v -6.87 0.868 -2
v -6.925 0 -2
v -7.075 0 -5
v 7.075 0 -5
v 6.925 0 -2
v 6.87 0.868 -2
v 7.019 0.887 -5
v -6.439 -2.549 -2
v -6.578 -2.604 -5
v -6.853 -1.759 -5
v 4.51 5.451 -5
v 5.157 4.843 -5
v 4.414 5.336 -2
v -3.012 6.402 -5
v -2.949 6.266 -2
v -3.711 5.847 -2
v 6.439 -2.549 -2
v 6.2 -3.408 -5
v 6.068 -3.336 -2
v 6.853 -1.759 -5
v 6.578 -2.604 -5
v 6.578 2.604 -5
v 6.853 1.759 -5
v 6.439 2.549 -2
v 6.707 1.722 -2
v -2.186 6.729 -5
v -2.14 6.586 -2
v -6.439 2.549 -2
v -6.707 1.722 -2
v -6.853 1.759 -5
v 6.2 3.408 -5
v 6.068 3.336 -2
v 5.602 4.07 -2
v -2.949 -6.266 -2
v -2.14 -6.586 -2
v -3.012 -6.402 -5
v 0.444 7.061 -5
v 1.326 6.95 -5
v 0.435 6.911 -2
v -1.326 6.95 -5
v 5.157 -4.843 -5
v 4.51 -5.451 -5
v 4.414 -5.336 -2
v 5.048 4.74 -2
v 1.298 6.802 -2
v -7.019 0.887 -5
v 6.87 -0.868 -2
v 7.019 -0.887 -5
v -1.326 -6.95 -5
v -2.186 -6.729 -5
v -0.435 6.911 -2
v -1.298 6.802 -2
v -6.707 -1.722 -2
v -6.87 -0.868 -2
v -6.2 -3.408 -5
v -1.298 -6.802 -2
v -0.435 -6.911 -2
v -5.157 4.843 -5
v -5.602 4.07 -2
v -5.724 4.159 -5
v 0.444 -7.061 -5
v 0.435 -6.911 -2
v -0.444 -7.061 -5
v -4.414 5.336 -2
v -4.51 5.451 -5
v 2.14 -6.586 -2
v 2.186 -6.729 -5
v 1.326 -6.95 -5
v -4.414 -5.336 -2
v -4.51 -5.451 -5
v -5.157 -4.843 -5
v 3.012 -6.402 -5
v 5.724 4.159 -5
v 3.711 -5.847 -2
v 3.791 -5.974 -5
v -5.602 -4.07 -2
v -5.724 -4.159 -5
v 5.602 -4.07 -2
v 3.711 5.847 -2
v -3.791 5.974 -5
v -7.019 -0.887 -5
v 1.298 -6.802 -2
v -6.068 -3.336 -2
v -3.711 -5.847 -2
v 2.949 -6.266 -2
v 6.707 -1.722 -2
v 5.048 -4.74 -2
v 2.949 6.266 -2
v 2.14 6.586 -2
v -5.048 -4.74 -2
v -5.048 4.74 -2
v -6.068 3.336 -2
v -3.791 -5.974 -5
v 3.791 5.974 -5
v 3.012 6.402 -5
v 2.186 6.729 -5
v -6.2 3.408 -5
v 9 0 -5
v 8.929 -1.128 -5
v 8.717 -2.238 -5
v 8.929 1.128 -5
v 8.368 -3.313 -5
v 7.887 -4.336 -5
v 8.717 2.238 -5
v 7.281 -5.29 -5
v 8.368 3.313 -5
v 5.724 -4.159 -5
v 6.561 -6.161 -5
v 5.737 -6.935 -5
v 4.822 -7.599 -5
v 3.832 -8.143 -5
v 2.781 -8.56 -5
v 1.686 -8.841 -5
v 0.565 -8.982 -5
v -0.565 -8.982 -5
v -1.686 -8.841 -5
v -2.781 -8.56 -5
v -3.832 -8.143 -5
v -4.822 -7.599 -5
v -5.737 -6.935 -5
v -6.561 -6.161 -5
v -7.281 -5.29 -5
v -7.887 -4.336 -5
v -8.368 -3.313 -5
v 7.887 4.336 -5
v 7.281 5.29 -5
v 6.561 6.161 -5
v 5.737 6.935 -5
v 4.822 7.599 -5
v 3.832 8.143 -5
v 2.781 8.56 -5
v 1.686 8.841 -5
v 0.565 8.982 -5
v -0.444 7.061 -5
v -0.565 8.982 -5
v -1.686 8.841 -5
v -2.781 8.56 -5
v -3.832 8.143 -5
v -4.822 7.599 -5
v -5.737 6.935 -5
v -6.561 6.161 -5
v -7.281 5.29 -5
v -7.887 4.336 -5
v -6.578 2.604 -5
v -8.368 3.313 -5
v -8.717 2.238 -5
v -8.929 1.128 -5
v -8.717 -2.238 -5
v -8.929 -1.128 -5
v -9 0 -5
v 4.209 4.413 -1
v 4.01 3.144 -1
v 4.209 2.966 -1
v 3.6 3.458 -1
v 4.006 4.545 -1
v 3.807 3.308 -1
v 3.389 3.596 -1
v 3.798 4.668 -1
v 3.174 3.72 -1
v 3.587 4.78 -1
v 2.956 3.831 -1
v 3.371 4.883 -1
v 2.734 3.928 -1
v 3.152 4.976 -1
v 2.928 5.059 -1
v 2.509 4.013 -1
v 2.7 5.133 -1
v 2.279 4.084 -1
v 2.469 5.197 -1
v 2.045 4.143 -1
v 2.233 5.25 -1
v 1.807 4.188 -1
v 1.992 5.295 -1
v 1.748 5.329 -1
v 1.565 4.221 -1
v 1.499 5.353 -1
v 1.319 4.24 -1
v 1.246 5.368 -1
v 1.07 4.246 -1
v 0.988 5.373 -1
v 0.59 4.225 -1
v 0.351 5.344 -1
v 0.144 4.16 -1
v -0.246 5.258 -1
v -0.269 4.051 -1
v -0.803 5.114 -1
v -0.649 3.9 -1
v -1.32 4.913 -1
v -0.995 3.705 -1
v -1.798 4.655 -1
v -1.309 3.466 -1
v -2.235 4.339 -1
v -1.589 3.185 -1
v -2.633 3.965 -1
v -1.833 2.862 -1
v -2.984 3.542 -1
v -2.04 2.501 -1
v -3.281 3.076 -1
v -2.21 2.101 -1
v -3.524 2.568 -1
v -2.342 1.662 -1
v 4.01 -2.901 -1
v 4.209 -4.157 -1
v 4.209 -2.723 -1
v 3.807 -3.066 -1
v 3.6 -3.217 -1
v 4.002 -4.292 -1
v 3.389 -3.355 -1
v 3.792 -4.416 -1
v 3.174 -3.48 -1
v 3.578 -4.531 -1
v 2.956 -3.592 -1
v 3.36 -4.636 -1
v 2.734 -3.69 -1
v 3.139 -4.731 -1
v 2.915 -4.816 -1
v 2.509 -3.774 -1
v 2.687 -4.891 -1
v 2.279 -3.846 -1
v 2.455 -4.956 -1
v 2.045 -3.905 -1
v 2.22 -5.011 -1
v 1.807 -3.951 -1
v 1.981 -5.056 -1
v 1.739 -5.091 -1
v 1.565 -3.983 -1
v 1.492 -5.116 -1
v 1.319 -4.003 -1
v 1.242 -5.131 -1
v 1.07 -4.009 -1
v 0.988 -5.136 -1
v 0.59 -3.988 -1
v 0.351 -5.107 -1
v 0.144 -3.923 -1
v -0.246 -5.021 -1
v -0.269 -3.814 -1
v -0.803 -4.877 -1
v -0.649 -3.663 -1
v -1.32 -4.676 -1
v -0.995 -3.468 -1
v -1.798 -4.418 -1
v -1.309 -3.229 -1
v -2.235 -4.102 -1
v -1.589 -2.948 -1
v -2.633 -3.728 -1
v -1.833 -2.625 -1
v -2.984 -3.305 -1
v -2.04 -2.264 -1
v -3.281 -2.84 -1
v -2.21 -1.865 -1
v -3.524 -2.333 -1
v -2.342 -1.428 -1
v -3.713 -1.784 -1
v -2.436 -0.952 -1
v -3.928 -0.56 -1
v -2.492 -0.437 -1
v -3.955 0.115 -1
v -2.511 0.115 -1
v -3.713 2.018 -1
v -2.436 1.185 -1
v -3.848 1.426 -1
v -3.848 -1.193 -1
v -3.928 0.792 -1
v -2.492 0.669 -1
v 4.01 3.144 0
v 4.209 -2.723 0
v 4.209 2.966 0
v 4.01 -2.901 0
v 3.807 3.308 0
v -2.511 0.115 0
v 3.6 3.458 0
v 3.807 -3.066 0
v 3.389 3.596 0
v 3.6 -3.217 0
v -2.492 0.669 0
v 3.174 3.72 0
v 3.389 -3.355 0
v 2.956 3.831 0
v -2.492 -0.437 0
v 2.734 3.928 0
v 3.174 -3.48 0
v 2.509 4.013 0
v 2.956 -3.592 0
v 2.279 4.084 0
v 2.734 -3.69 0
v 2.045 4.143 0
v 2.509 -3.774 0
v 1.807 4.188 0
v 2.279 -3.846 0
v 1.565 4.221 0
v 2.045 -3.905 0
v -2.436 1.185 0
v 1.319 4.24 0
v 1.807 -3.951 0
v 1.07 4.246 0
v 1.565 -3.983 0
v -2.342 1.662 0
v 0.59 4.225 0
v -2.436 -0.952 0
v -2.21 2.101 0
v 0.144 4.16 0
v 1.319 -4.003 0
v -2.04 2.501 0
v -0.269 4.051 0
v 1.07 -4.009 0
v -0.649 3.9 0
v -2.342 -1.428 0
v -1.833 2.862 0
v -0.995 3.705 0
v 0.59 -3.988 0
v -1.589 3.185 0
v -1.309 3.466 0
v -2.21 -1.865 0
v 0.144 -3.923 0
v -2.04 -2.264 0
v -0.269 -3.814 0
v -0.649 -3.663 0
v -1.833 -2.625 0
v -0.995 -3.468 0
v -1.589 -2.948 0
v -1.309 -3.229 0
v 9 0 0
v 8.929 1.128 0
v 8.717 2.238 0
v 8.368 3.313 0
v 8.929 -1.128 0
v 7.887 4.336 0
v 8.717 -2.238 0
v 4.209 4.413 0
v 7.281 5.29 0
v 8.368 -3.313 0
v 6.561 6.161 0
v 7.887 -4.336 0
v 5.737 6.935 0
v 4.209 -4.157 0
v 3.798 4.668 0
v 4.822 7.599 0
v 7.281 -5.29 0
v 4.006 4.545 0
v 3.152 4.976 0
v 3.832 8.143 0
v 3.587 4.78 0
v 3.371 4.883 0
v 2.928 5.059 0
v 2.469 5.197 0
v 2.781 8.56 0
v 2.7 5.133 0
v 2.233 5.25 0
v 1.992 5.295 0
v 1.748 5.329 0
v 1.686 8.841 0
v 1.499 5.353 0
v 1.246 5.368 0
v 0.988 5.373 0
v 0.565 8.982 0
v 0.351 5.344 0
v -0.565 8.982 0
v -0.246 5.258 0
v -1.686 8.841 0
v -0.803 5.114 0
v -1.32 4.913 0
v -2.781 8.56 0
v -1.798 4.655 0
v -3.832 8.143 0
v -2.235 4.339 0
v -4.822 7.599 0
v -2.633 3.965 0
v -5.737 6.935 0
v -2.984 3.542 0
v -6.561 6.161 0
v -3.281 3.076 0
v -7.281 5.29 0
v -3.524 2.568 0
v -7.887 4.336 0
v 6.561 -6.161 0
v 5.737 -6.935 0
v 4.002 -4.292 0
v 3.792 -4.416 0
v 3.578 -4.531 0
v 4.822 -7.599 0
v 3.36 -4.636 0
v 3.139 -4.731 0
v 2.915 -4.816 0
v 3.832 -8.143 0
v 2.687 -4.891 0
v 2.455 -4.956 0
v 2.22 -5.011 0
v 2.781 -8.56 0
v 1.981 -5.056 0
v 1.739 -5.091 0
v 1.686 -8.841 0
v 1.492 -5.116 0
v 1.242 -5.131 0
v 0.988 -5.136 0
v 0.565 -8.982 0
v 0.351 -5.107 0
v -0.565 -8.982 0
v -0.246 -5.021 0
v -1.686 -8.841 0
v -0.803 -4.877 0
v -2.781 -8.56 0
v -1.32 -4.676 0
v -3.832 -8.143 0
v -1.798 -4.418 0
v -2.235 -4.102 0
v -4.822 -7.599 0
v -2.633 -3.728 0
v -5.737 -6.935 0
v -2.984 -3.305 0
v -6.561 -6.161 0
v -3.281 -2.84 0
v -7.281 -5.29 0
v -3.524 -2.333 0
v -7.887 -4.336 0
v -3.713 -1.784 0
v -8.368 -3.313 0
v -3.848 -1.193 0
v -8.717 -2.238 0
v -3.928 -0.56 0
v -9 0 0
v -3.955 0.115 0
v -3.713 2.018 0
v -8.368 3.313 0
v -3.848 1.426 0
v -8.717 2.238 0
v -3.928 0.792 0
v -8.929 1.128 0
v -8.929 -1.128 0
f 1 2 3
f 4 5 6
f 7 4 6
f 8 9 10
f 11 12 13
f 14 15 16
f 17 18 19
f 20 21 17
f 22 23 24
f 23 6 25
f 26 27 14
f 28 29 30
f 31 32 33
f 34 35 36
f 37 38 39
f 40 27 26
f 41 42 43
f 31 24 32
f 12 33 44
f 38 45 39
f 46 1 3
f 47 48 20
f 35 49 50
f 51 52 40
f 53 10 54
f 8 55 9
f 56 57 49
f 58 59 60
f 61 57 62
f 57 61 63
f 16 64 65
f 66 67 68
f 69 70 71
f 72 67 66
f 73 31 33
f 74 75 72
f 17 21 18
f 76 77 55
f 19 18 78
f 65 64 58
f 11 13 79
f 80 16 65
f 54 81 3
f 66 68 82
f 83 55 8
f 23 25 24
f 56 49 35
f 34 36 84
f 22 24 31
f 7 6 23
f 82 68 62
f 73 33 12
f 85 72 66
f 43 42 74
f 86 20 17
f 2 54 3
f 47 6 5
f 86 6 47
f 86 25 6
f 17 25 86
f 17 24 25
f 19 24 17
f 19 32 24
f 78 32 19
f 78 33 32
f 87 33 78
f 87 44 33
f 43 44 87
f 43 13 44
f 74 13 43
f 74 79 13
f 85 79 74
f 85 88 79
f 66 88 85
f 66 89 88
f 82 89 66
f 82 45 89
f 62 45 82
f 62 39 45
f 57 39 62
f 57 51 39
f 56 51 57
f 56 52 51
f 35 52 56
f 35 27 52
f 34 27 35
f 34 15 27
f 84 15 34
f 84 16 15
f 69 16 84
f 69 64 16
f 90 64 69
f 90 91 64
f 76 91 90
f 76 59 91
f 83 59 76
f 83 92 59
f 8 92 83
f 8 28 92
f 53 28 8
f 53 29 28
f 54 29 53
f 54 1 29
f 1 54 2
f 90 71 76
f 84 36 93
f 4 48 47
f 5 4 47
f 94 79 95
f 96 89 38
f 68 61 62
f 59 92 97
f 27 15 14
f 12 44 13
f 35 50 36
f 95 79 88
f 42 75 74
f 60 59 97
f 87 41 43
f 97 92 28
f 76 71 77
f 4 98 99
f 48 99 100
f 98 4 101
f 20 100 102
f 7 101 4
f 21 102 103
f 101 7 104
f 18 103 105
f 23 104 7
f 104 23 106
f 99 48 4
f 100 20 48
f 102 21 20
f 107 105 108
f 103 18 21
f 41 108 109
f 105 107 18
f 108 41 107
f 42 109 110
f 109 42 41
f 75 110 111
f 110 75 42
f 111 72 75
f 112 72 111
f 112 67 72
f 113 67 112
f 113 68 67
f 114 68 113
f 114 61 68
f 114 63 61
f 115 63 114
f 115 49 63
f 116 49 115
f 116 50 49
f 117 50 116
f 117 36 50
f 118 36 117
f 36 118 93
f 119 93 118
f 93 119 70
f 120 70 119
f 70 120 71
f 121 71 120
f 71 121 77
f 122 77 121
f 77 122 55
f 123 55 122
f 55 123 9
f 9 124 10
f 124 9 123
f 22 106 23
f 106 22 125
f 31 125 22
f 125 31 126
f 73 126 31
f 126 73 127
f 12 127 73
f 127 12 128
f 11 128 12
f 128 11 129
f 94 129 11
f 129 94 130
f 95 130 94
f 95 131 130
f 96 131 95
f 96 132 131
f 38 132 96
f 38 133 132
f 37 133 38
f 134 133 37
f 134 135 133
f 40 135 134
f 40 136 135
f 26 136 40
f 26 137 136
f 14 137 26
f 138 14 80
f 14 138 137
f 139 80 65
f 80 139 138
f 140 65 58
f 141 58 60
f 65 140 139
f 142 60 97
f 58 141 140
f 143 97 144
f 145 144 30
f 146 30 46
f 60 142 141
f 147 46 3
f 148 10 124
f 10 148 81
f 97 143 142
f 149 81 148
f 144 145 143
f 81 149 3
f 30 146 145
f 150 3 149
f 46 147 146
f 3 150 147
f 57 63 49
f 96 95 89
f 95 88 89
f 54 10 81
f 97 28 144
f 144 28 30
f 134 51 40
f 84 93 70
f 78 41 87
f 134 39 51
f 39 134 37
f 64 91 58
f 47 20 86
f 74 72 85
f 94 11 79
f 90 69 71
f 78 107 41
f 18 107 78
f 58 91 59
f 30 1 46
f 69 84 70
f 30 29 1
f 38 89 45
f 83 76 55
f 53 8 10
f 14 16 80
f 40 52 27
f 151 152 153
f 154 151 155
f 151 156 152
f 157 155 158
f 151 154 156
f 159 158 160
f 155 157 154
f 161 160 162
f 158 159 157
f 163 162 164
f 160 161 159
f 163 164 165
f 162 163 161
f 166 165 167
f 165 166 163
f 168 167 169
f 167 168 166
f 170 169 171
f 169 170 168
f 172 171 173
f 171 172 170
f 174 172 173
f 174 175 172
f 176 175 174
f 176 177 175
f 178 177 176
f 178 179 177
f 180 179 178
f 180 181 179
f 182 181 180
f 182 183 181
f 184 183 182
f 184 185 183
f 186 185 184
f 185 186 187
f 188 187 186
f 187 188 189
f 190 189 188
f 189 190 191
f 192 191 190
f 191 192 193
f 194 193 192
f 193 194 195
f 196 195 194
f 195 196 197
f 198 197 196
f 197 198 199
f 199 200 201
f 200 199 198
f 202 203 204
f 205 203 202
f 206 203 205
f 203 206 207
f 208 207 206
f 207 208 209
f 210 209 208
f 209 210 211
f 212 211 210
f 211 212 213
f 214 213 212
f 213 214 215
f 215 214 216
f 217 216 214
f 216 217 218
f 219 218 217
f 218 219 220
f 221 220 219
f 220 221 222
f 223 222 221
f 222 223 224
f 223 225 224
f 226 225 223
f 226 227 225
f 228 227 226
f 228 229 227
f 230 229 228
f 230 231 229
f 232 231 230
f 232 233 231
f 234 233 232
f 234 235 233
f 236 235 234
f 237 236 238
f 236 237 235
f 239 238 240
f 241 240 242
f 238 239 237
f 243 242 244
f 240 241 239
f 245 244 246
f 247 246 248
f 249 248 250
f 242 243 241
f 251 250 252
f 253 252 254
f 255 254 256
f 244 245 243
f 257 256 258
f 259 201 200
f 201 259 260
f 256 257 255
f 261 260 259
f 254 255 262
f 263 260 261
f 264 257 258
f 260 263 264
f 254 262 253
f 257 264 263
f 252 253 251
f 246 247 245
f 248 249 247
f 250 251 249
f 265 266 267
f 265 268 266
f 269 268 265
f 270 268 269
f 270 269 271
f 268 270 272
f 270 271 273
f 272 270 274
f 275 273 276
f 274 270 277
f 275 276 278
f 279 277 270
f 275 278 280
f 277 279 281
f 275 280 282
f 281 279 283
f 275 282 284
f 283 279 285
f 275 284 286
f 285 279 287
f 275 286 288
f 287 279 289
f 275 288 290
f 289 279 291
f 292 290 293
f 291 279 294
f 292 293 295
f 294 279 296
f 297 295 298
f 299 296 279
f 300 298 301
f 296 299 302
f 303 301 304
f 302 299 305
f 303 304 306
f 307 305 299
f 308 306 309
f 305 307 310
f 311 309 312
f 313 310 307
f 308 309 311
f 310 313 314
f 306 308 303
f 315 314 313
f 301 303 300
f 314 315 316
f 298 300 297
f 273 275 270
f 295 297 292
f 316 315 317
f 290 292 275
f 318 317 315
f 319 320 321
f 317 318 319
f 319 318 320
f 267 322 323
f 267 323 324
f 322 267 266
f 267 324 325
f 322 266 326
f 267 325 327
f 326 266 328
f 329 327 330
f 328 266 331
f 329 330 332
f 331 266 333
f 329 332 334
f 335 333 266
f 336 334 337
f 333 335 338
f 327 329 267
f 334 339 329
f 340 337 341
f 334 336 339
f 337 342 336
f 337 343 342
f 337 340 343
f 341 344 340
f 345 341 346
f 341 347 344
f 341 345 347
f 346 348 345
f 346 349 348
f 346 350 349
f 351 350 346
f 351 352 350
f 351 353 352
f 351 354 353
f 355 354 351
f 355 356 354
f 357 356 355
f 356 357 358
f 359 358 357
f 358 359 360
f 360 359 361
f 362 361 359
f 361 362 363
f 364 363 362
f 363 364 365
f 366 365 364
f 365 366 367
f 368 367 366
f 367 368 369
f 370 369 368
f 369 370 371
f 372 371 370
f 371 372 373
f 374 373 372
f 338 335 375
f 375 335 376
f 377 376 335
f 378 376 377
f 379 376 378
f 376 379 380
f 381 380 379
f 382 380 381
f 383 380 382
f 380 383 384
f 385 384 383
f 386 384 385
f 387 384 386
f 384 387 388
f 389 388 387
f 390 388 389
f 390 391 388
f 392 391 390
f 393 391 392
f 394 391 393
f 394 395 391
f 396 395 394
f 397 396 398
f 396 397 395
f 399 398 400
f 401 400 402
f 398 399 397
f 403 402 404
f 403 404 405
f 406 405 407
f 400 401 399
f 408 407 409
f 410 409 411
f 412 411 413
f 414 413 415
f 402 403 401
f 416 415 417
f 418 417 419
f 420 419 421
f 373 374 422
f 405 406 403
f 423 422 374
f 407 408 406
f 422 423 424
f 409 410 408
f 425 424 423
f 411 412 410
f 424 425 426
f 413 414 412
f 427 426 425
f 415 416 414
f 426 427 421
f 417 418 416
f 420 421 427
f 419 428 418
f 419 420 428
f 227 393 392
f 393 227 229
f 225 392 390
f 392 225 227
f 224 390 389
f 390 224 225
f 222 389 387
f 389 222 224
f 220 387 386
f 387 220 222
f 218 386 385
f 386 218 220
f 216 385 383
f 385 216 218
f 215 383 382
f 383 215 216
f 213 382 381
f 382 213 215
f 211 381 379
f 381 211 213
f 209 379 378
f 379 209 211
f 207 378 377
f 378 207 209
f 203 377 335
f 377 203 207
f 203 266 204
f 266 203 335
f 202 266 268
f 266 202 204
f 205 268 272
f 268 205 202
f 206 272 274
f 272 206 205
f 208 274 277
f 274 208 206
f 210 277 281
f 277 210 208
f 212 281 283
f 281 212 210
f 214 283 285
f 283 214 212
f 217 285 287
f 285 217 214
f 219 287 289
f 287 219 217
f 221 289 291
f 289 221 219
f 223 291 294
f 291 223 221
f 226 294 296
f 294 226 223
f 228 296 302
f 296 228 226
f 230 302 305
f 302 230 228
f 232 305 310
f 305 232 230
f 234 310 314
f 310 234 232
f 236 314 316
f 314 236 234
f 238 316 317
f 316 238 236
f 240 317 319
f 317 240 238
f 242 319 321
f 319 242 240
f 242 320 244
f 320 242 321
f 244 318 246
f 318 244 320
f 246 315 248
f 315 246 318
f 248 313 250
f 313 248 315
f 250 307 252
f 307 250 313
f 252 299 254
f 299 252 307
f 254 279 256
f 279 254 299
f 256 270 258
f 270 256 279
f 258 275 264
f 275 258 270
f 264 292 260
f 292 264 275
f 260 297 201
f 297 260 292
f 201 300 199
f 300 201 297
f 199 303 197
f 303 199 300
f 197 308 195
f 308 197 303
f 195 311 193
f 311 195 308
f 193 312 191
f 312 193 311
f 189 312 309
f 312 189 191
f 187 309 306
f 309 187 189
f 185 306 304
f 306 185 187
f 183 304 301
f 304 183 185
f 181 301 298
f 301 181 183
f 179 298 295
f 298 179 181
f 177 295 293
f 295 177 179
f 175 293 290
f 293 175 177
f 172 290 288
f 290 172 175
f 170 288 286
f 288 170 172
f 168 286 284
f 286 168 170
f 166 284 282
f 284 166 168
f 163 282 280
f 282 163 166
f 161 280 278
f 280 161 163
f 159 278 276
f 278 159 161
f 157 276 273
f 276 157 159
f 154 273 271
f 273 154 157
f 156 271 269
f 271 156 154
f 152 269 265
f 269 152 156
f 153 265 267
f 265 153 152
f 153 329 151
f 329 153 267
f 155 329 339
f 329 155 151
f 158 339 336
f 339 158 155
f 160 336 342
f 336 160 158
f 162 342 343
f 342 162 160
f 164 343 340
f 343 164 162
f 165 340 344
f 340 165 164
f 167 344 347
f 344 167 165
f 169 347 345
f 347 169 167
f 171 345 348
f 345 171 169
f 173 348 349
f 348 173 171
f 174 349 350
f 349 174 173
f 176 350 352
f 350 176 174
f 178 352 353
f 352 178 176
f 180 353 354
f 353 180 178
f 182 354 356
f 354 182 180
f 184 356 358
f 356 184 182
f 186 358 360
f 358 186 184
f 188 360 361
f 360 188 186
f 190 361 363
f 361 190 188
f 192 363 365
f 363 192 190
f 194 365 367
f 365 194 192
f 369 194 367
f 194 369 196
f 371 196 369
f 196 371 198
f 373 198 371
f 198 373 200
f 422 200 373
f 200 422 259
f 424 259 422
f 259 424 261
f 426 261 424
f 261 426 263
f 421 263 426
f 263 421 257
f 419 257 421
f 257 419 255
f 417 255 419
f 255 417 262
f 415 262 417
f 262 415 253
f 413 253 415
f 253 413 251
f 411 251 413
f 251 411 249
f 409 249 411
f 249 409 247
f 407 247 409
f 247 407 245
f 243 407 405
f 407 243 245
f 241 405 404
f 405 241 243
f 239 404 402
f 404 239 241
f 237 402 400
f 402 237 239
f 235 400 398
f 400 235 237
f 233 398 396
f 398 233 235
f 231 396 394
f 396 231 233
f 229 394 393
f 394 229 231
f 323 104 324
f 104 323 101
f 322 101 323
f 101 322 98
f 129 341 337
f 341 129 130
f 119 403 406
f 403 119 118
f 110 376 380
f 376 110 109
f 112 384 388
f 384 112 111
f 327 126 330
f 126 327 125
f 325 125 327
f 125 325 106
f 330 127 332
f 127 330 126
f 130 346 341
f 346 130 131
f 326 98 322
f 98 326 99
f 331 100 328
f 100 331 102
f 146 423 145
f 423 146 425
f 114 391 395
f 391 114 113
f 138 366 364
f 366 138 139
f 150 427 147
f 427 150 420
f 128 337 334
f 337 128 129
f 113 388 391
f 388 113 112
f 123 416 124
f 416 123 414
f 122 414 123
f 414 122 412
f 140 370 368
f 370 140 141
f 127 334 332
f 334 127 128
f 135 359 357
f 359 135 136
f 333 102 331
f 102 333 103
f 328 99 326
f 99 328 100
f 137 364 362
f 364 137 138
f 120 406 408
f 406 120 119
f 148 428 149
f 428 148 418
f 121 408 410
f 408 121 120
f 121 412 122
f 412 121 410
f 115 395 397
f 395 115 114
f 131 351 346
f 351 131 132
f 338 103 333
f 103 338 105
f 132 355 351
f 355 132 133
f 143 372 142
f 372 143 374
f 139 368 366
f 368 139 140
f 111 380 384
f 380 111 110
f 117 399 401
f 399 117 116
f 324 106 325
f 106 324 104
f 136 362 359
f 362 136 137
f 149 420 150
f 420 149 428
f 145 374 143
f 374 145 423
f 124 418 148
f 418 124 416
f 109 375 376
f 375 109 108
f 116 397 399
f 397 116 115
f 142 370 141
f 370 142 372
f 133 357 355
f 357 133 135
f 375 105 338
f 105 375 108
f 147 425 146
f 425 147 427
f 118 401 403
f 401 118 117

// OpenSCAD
$fn = 50;


difference() {
	union() {
		translate(v = [0, 0, -5.0000000000]) {
			cylinder(h = 5, r = 9.0000000000);
		}
	}
	union() {
		#translate(v = [0, 0, -5.0000000000]) {
			cylinder(h = 3, r1 = 7.0750000000, r2 = 6.9250000000);
		}
		translate(v = [0, 0, -1]) {
			linear_extrude(height = 1) {
				text(font = "Impact", halign = "center", size = 10, text = "C", valign = "center");
			}
		}
	}
}
